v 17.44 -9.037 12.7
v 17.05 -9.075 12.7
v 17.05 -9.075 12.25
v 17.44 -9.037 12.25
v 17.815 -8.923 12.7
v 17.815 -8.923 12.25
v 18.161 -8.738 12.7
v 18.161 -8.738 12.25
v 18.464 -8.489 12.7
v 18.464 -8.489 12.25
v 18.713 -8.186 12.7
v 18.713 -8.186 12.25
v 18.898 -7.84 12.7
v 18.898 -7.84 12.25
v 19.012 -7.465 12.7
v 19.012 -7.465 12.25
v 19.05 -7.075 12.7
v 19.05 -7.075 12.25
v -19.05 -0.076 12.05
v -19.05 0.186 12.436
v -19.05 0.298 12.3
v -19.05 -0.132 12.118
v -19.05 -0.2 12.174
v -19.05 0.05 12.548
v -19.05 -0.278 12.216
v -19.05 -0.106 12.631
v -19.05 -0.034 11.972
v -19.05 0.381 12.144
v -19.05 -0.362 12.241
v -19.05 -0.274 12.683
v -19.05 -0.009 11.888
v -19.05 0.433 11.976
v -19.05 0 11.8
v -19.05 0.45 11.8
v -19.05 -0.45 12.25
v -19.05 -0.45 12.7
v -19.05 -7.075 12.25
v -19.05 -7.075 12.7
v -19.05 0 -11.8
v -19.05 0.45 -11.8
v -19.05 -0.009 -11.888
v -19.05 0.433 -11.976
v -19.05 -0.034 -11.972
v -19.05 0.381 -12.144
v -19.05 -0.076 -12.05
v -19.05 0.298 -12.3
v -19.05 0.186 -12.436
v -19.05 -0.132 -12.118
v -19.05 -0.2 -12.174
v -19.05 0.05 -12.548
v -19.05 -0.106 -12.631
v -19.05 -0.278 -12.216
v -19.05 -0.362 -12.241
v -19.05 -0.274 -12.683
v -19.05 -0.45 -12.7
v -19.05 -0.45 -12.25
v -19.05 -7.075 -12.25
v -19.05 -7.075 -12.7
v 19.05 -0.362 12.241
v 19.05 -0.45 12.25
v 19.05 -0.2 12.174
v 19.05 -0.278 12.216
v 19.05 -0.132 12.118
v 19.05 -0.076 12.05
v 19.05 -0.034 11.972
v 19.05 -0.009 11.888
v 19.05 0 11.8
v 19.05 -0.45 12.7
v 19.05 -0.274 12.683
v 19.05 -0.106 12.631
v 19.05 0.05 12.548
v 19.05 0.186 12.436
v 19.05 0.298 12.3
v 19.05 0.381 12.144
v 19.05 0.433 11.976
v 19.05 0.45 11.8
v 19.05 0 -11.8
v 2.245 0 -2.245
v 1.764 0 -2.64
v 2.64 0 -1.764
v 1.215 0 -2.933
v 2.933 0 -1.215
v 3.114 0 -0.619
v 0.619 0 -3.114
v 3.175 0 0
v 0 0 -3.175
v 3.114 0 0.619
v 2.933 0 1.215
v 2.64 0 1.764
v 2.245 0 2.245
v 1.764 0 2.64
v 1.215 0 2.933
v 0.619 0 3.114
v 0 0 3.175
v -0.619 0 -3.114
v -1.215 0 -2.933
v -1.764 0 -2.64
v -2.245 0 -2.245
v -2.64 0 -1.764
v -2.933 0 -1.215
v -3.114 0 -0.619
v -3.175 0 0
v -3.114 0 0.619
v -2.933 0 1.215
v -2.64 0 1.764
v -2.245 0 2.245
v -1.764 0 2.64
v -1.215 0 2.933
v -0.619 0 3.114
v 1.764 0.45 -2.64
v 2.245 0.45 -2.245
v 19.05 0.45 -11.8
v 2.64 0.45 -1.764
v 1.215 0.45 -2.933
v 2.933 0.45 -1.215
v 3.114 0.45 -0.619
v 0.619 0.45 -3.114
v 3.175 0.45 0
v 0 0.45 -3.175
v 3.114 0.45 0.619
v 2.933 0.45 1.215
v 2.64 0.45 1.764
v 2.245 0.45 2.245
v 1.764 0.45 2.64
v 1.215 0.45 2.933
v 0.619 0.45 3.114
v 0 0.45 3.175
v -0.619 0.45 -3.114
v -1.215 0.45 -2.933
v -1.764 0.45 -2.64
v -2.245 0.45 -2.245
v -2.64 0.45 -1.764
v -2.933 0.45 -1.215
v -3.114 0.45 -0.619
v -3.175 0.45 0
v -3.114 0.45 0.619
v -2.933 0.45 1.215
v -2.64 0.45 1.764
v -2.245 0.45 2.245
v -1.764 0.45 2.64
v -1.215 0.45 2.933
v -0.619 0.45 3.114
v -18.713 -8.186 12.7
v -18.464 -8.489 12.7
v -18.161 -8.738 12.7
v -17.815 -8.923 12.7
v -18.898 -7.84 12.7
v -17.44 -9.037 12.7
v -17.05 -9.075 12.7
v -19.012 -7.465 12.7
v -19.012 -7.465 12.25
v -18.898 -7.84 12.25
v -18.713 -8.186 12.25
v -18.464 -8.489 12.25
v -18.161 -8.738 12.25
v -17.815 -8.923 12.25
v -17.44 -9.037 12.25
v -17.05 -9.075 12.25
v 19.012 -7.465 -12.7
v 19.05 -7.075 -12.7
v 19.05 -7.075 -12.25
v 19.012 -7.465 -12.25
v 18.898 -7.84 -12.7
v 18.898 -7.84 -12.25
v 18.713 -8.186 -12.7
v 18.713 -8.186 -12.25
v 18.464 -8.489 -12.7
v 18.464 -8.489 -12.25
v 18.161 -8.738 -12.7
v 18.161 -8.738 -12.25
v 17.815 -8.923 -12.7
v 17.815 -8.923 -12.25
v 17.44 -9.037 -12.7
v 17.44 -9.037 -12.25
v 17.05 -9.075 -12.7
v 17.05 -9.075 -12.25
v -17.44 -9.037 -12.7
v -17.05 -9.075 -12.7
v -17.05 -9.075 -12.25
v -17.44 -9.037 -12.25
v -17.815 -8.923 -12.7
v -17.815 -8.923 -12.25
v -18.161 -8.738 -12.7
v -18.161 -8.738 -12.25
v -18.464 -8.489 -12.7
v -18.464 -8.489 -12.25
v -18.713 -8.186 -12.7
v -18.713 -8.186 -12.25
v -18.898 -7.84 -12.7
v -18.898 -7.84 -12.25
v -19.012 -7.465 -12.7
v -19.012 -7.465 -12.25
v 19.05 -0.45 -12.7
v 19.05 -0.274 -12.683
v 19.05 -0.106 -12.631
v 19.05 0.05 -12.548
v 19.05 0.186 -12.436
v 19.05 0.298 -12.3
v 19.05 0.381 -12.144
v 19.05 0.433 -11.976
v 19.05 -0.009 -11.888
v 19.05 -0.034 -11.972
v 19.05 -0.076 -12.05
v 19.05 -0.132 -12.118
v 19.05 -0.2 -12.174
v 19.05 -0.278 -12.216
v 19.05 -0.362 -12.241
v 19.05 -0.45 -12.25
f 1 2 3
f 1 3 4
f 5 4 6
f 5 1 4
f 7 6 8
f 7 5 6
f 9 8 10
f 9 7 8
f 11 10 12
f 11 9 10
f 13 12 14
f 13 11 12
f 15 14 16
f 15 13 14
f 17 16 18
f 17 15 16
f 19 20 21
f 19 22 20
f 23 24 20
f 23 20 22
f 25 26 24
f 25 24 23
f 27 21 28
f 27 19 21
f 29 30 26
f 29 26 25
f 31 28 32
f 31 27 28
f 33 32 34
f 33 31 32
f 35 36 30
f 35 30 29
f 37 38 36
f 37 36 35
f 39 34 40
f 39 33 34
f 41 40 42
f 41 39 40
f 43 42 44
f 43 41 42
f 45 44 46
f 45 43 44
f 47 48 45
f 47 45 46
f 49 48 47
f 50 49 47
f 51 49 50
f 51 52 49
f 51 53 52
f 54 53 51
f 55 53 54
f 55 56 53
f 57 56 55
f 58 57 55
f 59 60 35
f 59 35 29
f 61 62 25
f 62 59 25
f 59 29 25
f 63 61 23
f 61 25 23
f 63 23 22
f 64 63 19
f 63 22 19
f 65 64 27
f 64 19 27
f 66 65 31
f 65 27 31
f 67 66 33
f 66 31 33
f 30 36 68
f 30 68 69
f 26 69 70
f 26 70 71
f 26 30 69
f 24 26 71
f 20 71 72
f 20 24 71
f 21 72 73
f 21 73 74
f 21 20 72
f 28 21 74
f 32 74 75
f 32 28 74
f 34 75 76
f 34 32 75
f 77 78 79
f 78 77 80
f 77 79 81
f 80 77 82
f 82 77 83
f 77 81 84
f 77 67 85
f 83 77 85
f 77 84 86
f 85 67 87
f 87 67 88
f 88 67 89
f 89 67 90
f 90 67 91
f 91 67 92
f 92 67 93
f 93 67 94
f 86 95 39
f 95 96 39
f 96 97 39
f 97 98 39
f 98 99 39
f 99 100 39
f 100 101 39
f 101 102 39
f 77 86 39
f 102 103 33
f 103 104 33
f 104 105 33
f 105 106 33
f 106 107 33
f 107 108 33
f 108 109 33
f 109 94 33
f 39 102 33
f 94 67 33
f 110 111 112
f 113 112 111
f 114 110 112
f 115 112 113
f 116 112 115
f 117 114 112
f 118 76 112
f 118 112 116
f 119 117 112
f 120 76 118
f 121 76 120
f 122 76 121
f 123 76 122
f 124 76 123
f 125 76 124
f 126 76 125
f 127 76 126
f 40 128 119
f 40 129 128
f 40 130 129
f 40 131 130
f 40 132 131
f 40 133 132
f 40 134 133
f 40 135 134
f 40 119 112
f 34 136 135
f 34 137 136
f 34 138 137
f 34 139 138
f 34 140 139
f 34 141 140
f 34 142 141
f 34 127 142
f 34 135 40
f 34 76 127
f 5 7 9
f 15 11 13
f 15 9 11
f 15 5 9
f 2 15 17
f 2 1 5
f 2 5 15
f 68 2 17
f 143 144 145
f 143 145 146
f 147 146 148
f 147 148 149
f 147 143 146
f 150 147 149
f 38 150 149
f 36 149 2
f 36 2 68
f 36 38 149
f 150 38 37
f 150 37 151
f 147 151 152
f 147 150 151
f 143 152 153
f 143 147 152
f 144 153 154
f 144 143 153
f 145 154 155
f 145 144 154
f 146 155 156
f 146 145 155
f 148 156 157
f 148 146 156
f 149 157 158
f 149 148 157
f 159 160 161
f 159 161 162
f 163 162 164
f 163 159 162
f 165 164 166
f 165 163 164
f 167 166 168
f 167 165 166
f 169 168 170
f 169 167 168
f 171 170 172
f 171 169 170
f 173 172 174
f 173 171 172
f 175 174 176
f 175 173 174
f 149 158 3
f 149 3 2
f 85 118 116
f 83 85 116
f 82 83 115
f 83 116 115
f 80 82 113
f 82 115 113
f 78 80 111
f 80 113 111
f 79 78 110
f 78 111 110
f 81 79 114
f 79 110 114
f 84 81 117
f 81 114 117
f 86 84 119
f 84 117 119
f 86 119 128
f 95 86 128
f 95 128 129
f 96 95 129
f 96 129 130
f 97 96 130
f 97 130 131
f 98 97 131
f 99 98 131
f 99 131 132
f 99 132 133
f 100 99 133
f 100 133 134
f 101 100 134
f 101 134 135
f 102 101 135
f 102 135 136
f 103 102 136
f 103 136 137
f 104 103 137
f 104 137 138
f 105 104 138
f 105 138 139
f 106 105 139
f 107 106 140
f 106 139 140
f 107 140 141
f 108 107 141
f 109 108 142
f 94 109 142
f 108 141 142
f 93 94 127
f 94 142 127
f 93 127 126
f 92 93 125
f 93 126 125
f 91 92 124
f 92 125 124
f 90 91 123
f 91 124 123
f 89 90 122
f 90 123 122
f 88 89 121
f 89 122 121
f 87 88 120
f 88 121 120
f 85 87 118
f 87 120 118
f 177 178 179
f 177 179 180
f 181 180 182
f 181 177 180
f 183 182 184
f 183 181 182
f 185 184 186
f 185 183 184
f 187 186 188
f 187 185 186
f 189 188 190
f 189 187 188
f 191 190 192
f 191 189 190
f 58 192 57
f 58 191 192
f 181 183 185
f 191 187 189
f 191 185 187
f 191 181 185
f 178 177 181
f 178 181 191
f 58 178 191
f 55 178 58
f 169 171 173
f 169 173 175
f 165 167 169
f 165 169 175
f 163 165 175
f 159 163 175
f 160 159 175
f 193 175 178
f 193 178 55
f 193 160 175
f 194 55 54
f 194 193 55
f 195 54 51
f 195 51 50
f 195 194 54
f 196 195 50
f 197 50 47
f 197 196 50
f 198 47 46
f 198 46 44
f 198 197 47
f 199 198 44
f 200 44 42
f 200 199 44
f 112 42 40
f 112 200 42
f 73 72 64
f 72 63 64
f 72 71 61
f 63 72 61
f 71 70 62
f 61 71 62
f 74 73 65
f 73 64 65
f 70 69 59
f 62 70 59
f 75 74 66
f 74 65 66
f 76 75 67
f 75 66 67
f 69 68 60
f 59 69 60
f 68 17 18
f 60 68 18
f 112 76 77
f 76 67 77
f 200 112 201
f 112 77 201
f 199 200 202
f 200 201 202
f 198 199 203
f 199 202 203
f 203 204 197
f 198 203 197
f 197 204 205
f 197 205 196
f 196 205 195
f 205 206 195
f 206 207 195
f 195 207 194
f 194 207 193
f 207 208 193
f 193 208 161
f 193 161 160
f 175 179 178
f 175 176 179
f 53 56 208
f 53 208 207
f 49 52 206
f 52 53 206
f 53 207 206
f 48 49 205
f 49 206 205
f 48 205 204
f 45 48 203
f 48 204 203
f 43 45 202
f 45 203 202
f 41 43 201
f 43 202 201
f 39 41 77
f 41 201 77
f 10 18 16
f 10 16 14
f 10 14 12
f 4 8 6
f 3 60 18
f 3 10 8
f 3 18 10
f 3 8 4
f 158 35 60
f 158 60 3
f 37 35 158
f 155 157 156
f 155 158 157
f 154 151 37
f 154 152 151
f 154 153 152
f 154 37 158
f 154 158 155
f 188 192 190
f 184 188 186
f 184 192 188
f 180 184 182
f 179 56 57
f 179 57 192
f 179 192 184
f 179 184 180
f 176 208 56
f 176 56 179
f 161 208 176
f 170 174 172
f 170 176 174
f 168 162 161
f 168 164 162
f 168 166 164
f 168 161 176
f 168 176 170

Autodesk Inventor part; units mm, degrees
ref_plane "YZ Plane" through (0, 0, 0) normal (1, 0, 0) x (0, 1, 0)
ref_plane "XZ Plane" through (0, 0, 0) normal (0, 1, 0) x (-1, 0, 0)
ref_plane "XY Plane" through (0, 0, 0) normal (0, 0, 1) x (1, 0, 0)
sketch "Boceto1" plane through (0, 0, 0) normal (0, 1, 0) x (-1, 0, 0)
  line L0 (19.05, -12.7) -> (-19.05, -12.7)
  line L1 (-19.05, -12.7) -> (-19.05, 12.7)
  line L2 (-19.05, 12.7) -> (19.05, 12.7)
  line L3 (19.05, 12.7) -> (19.05, -12.7)
  line L4 (19.05, -12.7) -> (-19.05, 12.7) construction
  line L5 (-19.05, -12.7) -> (19.05, 12.7) construction
  point P0 (0, 0)
  dimension "d0" = 38.1
  dimension "d1" = 25.4
extrude "Placa1" add sketch "Boceto1" along normal blind 0.45
sketch "Boceto2" plane through (-19.05, 0.45, 12.25) normal (0, 0, 1) x (1, 0, 0)
  line L0 (38.1, 0) -> (0, 0)
  line L1 (0, 0) -> (0, -9.525)
  line L2 (0, -9.525) -> (38.1, -9.525)
  line L3 (38.1, -9.525) -> (38.1, 0)
edge flange "Pestaña1" height 9.525 angle 90 thickness 0.45 bend radius 0.45 thickness toward (0, 0, 1) relief tear relief width 0.45 relief depth 0.225 corner gap 0.45 corner form 0 edges at (0, 0, 12.7) (0, 0, -12.7) wall of the first edge with corners at (19.05, 0.45, 12.25) (-19.05, 0.45, 12.25) (-19.05, -9.075, 12.25) (19.05, -9.075, 12.25)
bend "Doblez1"
corner "Esquina1"
fillet "Empalme1" radius 2 4 edges at (19.05, -9.075, 12.475) (19.05, -9.075, -12.475) (-19.05, -9.075, 12.475) (-19.05, -9.075, -12.475)
sketch "Boceto3" plane through (0, 0.45, 0) normal (0, 1, 0) x (1, 0, 0)
  circle A0 centre (0, 0) radius 3.175
  dimension "d14" = 6.35
extrude "Cortar1" cut sketch "Boceto3" against normal blind 0.45
equation "\"d15\" = Grosor"
equation "\"d2\" = Grosor"
equation "\"d3\" = Anchura_desahogo_plegado"
equation "\"d4\" = Profundidad_desahogo_plegado"
equation "\"d5\" = Remanente_mínimo"
equation "\"d6\" = Radiodetransición"
equation "\"d9\" = Radio_pliegue"
equation "\"d10\" = Tamaño_destalonado"
equation "\"d11\" = TamañoSeparación"
equation "\"d12\" = Tamaño_de_radio_de_Jacobi"
equation "\"Radio_pliegue\" = Grosor"
equation "\"Anchura_desahogo_plegado\" = Grosor"
equation "\"Profundidad_desahogo_plegado\" = 0.5 * Grosor"
equation "\"Tamaño_destalonado\" = 4 * Grosor"
equation "\"Remanente_mínimo\" = 2 * Grosor"
equation "\"Radiodetransición\" = Radio_pliegue"
equation "\"Tamaño_de_radio_de_Jacobi\" = Radio_pliegue"
equation "\"TamañoSeparación\" = Grosor"
equation "\"Grosor\" = 0.45"
properties part number "guarda_conector_ceramico" material "Acero AISI 1006 85 LC"
